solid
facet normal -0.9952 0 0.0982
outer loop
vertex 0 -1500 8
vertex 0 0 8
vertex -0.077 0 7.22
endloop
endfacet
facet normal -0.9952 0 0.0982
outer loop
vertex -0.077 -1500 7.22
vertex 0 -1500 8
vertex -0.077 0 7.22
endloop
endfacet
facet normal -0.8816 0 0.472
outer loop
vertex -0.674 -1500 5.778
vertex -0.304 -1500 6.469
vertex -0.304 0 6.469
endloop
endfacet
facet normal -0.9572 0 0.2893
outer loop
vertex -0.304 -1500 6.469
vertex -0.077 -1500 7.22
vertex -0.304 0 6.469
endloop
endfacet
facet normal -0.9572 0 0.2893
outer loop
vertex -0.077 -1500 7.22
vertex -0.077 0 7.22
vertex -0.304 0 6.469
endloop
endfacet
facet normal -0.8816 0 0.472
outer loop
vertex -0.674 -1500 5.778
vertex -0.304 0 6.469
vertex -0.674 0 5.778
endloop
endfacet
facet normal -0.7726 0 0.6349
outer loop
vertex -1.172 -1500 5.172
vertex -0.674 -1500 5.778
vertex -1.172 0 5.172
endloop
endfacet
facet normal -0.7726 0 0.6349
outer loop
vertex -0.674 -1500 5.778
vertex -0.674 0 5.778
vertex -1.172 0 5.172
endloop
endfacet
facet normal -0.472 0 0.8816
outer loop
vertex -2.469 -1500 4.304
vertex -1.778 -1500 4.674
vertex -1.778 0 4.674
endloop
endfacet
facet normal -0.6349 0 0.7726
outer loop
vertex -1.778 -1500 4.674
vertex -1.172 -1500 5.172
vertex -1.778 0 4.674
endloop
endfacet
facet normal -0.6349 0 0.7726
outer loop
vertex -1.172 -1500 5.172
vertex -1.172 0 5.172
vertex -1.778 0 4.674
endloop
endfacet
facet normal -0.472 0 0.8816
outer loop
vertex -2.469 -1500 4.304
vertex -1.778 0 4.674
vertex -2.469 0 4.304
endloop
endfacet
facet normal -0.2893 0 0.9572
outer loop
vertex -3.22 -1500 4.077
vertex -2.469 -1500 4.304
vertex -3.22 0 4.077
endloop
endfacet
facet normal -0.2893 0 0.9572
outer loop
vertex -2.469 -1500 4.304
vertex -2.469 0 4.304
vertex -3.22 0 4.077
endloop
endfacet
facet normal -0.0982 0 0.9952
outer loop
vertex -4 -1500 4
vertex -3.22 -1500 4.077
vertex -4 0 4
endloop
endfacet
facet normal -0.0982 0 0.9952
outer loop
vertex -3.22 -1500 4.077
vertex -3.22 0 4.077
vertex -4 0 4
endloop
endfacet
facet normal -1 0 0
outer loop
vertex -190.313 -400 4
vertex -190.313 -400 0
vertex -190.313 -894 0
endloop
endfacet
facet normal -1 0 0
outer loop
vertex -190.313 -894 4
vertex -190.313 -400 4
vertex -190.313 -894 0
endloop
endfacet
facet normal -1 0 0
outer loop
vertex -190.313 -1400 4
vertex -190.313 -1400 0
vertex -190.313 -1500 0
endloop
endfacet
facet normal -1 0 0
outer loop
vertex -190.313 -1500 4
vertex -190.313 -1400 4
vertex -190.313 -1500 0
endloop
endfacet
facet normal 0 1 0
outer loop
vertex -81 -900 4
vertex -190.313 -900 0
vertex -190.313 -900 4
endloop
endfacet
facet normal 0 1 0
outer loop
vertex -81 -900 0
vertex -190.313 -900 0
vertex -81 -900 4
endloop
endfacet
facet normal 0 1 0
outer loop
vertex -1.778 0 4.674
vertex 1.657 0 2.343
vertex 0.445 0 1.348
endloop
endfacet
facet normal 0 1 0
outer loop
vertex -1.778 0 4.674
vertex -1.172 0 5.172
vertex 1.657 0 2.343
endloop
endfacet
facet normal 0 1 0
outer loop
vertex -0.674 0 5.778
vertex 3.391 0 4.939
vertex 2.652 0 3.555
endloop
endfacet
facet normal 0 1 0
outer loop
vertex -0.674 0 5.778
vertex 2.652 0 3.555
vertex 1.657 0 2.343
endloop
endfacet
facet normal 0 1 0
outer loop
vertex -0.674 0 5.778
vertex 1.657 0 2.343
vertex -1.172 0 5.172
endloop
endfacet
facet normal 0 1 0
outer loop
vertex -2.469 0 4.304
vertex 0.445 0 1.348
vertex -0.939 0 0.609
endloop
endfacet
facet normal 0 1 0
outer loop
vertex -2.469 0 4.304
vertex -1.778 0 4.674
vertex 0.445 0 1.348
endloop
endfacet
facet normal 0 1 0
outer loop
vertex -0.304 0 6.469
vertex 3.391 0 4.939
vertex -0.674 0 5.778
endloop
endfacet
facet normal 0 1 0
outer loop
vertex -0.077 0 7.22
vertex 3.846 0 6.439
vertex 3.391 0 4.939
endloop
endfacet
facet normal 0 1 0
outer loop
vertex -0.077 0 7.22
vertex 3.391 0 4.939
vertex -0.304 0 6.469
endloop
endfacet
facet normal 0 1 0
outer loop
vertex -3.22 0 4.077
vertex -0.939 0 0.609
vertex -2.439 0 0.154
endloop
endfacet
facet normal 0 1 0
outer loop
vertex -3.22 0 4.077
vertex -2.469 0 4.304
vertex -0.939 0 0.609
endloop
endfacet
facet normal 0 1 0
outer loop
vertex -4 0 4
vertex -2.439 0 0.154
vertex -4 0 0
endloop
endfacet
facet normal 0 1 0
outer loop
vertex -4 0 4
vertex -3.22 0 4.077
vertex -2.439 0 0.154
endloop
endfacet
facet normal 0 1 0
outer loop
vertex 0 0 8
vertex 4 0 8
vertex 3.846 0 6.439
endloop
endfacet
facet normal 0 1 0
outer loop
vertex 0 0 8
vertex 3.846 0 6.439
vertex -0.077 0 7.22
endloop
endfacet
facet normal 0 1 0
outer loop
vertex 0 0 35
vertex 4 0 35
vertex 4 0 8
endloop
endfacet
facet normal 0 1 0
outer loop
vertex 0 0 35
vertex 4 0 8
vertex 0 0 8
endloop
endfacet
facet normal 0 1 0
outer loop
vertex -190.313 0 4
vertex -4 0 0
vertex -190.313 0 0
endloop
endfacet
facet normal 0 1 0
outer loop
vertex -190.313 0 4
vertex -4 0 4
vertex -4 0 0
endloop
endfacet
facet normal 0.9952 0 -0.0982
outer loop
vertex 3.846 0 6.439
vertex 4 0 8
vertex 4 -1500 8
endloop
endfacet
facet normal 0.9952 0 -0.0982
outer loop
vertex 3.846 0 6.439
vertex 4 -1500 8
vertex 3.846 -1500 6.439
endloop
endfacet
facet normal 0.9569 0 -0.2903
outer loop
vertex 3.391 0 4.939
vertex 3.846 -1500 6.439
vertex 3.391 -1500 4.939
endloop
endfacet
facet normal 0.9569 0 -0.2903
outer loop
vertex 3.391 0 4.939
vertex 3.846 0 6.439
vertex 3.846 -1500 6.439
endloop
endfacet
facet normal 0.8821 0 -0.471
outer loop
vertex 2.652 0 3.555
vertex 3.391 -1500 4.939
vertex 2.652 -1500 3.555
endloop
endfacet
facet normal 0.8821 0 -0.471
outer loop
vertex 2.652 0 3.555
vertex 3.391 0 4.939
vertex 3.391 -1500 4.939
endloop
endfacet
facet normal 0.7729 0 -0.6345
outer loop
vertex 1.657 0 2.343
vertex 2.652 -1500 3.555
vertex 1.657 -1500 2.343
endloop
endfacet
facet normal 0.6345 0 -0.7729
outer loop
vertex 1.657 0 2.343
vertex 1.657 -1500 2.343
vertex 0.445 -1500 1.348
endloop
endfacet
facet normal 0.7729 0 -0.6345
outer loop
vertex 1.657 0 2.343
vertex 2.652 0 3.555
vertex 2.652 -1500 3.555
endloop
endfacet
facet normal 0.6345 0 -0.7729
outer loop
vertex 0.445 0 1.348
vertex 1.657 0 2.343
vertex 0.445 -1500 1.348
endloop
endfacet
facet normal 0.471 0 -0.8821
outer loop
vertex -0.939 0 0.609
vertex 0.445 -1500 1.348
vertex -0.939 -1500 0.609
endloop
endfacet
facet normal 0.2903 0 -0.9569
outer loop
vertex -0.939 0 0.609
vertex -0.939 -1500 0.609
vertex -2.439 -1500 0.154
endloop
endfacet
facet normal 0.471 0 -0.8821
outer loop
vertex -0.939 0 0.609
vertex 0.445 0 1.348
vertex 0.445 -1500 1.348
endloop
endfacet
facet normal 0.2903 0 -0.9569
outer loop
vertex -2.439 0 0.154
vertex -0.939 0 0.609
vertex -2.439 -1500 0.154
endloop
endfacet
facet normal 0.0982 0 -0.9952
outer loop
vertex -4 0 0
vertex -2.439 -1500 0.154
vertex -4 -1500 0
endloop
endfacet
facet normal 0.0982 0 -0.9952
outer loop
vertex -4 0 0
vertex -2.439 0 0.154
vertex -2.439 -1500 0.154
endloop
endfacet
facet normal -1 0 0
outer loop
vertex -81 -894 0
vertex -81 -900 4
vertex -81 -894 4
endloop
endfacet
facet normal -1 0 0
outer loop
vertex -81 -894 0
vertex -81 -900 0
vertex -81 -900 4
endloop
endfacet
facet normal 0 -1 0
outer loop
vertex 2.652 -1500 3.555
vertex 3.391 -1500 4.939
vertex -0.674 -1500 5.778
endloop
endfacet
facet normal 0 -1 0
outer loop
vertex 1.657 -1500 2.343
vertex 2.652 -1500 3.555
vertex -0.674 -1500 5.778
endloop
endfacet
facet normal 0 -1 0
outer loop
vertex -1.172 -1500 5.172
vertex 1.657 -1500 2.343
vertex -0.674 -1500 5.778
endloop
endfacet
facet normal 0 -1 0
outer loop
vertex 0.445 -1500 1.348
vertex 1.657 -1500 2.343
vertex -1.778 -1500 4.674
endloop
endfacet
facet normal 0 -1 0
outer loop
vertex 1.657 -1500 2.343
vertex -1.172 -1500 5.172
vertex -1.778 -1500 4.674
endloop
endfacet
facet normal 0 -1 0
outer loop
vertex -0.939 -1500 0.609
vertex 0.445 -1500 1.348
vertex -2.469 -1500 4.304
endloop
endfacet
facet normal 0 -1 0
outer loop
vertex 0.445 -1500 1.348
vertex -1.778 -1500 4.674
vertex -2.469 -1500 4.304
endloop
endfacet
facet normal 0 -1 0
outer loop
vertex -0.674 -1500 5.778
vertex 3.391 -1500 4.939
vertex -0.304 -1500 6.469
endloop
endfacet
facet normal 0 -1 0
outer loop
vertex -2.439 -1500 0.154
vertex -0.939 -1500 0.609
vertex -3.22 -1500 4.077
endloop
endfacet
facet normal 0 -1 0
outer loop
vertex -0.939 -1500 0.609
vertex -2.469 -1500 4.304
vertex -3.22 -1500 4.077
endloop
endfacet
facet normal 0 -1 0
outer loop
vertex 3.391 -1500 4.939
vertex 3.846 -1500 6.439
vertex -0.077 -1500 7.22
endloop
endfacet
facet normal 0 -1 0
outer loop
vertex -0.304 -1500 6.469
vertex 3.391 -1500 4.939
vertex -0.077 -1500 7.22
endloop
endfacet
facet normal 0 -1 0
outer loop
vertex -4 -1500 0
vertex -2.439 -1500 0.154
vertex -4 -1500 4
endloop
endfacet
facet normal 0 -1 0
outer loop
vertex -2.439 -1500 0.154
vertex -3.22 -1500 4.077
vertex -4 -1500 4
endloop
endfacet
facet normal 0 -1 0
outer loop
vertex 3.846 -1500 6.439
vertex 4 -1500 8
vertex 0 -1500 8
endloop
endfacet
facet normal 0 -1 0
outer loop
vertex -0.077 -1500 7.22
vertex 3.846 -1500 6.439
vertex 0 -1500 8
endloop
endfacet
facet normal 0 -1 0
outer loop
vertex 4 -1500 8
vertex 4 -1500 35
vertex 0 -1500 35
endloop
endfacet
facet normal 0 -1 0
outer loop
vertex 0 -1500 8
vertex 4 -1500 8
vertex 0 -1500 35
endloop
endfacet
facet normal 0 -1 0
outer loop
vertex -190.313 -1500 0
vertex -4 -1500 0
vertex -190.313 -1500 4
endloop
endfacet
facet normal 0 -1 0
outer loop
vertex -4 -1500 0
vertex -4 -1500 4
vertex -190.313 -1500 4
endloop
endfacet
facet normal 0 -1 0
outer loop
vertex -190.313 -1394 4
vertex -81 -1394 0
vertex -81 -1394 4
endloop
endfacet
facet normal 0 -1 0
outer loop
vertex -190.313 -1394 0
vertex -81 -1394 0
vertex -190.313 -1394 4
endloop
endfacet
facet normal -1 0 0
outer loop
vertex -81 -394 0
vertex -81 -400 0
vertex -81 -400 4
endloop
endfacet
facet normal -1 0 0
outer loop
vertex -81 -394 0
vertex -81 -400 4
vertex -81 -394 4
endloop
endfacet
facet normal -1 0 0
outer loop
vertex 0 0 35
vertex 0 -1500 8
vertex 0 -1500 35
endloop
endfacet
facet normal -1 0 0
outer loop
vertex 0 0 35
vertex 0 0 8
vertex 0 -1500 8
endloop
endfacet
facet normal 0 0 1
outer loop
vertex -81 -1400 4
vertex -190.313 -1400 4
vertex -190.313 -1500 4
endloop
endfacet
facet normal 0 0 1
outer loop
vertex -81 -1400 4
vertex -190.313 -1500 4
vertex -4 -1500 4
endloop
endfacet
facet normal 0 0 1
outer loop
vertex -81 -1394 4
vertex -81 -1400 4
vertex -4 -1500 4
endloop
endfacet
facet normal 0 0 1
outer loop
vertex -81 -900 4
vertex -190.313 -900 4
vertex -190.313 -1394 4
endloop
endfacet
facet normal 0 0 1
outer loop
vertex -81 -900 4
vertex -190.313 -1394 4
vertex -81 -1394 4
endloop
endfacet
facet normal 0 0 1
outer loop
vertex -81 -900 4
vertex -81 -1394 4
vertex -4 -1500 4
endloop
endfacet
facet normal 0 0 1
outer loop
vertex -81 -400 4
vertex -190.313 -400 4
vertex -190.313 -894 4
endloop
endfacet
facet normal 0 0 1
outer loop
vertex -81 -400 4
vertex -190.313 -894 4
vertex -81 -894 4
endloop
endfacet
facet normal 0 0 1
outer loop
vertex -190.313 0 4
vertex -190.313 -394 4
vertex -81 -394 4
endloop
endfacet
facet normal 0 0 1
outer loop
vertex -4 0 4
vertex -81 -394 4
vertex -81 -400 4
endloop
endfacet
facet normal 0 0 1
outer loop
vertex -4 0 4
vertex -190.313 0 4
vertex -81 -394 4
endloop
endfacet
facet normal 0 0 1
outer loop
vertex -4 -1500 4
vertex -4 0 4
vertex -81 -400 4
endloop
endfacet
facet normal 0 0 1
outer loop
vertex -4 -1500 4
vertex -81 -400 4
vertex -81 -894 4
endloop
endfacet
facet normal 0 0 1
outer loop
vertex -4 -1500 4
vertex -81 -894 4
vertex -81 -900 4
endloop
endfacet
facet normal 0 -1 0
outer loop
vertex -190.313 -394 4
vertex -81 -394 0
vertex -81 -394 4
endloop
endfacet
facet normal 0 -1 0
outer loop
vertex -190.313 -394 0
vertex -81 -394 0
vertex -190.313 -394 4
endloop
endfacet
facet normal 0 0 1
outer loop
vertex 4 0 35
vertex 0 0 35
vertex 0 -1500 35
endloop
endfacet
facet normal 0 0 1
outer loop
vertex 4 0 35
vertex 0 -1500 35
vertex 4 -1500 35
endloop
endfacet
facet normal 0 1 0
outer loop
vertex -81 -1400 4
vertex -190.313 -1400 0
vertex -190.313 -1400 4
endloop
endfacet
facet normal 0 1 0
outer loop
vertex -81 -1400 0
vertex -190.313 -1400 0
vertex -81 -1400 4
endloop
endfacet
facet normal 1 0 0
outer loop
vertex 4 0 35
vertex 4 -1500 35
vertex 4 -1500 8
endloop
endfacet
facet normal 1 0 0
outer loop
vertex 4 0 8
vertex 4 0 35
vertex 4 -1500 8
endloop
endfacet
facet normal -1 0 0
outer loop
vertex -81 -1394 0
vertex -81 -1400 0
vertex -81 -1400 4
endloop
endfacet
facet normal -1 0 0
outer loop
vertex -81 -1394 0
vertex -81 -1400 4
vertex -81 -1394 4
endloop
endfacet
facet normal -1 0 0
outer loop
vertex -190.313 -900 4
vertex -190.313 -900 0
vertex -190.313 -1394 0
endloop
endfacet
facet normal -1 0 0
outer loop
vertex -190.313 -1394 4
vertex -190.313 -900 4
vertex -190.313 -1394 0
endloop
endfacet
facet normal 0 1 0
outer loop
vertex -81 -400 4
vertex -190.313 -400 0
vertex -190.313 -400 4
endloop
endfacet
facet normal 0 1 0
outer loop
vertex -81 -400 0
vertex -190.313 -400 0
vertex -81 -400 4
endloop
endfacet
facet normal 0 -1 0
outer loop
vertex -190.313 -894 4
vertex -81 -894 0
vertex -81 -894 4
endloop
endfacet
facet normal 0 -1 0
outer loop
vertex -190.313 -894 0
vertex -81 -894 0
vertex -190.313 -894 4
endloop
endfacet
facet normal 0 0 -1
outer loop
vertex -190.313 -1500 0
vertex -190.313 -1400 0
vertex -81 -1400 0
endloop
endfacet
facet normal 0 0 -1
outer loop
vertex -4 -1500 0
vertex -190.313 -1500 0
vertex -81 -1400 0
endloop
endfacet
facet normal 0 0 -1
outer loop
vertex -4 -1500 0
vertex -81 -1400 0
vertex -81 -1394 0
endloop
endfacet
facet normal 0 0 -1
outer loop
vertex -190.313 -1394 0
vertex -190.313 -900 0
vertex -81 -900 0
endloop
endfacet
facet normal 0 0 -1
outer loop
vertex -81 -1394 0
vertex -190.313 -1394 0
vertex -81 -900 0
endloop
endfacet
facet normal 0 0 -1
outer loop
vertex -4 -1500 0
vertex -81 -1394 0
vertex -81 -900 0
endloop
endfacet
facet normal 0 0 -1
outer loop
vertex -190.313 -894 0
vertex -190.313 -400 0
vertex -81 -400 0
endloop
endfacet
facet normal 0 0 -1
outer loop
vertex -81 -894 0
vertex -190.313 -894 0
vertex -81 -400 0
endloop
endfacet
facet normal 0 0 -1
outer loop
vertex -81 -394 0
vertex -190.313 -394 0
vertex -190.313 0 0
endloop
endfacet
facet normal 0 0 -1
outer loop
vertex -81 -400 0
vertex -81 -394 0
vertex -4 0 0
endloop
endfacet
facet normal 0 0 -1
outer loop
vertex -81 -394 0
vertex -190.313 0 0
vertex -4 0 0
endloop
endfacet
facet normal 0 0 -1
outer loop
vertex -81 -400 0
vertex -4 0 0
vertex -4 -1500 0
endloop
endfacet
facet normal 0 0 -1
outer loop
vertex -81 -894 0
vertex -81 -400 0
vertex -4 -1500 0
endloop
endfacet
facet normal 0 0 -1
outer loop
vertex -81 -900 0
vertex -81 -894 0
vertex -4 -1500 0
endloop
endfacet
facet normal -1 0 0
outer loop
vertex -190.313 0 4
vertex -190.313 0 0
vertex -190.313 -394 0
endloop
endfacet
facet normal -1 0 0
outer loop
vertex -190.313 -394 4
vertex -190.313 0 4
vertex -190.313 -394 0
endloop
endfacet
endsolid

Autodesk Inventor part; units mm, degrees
ref_plane "YZ Plane" through (0, 0, 0) normal (1, 0, 0) x (0, 1, 0)
ref_plane "XZ Plane" through (0, 0, 0) normal (0, 1, 0) x (-1, 0, 0)
ref_plane "XY Plane" through (0, 0, 0) normal (0, 0, 1) x (1, 0, 0)
sketch "Sketch1" plane through (0, 0, 0) normal (0, 0, 1) x (1, 0, 0)
  line L0 (0, 0) -> (-190.3129, 0)
  line L1 (-190.3129, 0) -> (-190.3129, -1500)
  line L2 (-190.3129, -1500) -> (0, -1500)
  line L3 (0, -1500) -> (0, 0)
  line L4 (-190.3129, -1400) -> (-81, -1400)
  line L5 (-81, -1400) -> (-81, -1394)
  line L6 (-81, -1394) -> (-190.3129, -1394)
  line L7 (-190.3129, -1394) -> (-190.3129, -1400)
  line L8 (-190.3129, -900) -> (-81, -900)
  line L9 (-81, -900) -> (-81, -894)
  line L10 (-81, -894) -> (-190.3129, -894)
  line L11 (-190.3129, -894) -> (-190.3129, -900)
  line L12 (-190.3129, -400) -> (-81, -400)
  line L13 (-81, -400) -> (-81, -394)
  line L14 (-81, -394) -> (-190.3129, -394)
  line L15 (-190.3129, -394) -> (-190.3129, -400)
  point P0 (-190.3129, -400)
  point P1 (-190.3129, -894)
  point P2 (-190.3129, -900)
  dimension "d0" = 1500
  dimension "d1" = 190.3129
  dimension "d2" = 6
  dimension "d4" = 100
  dimension "d7" = 500
  dimension "d23" = 81
extrude "Plate1" add sketch "Sketch1" along normal blind 4 contours L3 L2 L1 L4 L5 L6 L8 L9 L10 L12 L13 L14 L0
sketch "Sketch2" plane through (4, 0, 0) normal (-1, 0, 0) x (0, -1, 0)
  line L0 (1500, 0) -> (0, 0)
  line L1 (0, 0) -> (0, 35)
  line L2 (0, 35) -> (1500, 35)
  line L3 (1500, 35) -> (1500, 0)
edge flange "Flange1" height 35 angle 90 thickness 4 bend radius 4 thickness toward (-1, 0, 0) relief tear relief width 4 relief depth 2 edges at (0, -750, 4) wall of the first edge with corners at (4, -1500, 0) (4, 0, 0) (4, 0, 35) (4, -1500, 35)
bend "Bend1"
corner "Corner1"
equation "\"d1\" = стрингерглубина1"
equation "\"d12\" = Thickness"
equation "\"d13\" = BendReliefWidth"
equation "\"d14\" = BendReliefDepth"
equation "\"d15\" = MinimumRemnant"
equation "\"d16\" = TransitionRadius"
equation "\"d19\" = BendRadius"
equation "\"d20\" = CornerReliefSize"
equation "\"d21\" = GapSize"
equation "\"d22\" = JacobiRadiusSize"
equation "\"BendRadius\" = Thickness"
equation "\"BendReliefWidth\" = Thickness"
equation "\"BendReliefDepth\" = 0.5 * Thickness"
equation "\"CornerReliefSize\" = 4 * Thickness"
equation "\"MinimumRemnant\" = 2 * Thickness"
equation "\"TransitionRadius\" = BendRadius"
equation "\"JacobiRadiusSize\" = BendRadius"
equation "\"GapSize\" = Thickness"
equation "\"стрингерглубина1\" = 190.312858"
equation "\"Thickness\" = 4"
properties part number "stringer 1_CPY2"
